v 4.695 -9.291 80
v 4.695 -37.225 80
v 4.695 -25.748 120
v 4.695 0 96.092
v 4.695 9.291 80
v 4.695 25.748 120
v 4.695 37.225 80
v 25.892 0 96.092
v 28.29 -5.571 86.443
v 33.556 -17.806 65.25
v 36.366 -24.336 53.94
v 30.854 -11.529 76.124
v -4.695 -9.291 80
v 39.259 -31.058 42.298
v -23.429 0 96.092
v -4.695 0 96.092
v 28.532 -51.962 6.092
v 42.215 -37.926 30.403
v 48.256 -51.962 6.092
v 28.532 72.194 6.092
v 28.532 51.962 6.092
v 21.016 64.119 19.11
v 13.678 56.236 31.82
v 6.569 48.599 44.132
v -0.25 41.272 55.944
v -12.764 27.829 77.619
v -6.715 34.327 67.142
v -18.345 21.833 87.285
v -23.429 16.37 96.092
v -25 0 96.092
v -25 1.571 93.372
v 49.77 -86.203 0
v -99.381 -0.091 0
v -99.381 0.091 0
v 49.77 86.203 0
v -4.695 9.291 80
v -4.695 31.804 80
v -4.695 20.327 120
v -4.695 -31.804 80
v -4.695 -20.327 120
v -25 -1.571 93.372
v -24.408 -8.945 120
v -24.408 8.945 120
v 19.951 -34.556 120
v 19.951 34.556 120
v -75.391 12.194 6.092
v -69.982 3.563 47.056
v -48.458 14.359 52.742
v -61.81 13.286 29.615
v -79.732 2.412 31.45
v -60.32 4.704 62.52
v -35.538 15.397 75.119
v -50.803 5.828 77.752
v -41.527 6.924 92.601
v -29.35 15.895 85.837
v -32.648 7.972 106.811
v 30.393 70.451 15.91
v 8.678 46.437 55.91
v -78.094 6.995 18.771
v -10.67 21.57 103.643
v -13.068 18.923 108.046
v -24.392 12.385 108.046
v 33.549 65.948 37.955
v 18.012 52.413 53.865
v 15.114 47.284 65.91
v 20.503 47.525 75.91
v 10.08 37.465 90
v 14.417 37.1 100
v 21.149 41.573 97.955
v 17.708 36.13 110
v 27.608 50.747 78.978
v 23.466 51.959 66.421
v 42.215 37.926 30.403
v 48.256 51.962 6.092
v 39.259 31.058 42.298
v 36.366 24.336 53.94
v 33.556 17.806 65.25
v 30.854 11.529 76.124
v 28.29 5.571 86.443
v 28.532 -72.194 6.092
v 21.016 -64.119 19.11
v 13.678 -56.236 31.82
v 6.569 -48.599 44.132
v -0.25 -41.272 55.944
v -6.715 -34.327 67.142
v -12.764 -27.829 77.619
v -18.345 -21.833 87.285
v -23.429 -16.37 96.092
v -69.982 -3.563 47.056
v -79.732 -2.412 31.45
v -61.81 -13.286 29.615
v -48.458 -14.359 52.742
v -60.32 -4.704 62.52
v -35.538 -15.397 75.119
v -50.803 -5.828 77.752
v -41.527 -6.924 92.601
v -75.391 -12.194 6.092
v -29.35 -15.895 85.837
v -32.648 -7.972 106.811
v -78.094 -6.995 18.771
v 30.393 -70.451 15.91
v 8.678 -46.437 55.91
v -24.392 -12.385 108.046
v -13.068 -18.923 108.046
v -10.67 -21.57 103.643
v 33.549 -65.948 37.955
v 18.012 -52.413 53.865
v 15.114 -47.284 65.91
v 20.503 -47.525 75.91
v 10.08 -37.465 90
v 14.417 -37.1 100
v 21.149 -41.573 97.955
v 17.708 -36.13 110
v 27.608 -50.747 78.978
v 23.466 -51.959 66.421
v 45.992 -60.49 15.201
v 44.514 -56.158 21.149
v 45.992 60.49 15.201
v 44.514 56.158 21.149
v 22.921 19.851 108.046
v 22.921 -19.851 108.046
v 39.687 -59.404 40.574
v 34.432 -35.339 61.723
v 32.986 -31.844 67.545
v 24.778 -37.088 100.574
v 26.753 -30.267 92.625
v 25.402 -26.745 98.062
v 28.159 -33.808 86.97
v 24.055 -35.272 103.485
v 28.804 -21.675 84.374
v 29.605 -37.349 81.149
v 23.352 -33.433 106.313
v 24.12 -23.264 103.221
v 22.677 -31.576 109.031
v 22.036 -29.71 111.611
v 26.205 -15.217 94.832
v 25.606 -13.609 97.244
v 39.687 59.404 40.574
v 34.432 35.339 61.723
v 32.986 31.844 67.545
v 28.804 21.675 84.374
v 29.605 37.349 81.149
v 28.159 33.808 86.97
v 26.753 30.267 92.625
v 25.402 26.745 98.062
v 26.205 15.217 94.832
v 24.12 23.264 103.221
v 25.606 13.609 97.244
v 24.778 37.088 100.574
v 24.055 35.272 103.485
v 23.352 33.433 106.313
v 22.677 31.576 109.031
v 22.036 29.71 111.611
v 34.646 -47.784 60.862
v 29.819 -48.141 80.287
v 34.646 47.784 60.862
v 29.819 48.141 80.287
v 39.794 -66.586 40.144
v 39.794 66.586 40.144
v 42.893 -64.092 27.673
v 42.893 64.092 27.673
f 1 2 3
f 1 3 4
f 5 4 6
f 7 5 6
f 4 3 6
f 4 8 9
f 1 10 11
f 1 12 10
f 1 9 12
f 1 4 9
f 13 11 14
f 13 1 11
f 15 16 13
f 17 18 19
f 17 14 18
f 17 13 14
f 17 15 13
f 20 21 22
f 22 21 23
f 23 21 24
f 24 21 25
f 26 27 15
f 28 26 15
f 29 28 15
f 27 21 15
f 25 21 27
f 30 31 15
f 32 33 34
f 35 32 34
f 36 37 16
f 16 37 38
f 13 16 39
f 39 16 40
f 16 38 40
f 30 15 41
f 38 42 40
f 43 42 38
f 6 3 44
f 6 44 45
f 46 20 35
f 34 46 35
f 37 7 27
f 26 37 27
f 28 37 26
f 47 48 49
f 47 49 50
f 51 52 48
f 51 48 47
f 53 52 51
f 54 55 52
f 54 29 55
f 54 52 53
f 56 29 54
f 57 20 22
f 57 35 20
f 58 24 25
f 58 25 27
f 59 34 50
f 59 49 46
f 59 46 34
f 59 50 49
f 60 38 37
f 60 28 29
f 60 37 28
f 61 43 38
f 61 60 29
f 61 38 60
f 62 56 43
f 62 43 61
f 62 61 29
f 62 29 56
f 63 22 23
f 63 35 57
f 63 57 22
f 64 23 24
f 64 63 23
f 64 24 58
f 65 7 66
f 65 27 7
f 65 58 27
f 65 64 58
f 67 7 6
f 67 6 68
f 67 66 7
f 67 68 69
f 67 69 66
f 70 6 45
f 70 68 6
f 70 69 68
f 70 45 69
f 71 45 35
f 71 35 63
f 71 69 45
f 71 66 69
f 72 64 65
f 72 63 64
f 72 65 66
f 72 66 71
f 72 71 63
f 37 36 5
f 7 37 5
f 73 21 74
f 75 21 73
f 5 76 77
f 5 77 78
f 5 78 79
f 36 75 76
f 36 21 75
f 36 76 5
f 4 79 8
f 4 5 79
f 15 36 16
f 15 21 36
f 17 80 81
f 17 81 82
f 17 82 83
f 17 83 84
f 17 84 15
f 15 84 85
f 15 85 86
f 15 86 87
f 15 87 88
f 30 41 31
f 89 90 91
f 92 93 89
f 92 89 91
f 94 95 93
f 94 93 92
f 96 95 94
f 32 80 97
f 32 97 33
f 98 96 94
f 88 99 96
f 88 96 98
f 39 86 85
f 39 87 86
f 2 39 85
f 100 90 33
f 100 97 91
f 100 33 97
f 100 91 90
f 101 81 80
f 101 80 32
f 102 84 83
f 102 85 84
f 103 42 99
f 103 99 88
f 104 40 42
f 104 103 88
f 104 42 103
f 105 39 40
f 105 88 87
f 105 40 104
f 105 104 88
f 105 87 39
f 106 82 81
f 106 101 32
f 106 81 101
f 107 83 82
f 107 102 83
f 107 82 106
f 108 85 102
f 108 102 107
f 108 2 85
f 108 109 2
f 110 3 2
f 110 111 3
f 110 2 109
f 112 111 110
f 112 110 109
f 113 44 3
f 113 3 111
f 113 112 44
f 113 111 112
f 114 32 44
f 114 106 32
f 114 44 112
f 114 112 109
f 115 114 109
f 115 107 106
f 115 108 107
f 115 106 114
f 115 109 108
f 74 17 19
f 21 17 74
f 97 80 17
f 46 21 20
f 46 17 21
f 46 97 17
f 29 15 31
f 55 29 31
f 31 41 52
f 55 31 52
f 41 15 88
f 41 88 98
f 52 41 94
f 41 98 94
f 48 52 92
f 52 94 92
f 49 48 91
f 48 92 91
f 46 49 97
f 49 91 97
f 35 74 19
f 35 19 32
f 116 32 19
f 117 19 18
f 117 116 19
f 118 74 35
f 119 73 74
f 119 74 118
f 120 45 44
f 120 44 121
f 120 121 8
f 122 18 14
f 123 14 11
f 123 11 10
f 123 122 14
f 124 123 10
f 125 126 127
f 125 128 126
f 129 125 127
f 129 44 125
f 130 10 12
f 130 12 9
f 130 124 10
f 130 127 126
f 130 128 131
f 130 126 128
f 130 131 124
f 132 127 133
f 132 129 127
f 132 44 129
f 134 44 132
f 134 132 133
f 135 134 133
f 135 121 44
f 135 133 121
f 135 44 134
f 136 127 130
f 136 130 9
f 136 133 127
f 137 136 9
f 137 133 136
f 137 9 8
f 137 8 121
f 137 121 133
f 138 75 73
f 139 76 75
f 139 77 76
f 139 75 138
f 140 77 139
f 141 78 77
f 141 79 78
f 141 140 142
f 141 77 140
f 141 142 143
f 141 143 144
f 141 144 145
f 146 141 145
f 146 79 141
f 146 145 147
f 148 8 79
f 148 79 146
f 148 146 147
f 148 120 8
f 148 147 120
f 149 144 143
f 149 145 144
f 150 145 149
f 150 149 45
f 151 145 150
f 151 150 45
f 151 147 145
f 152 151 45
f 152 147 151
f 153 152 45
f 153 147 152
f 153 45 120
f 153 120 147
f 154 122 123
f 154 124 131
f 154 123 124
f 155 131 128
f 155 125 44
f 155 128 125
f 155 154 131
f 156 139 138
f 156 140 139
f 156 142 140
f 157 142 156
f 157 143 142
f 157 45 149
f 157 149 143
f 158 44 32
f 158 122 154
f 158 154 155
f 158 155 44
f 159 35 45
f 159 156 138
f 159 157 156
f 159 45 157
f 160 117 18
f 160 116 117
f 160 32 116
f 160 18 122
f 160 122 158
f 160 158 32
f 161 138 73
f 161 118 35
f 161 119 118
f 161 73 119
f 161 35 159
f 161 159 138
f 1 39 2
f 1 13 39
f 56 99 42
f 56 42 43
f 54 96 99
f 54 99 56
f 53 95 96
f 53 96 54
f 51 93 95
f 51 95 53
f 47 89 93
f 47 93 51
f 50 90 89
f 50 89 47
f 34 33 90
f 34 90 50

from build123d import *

# Parameters (mm, degrees)
F5_DEPTH       = 40
F10_DEPTH      = 100
F10_DEPTH_BACK = 100
F12_DEPTH      = 100
F12_DEPTH_BACK = 25


with BuildPart() as f3:
    # F0 (on Top) → F3 section 0
    with BuildSketch(Plane.XY):
        Polygon((49.7695431113, -86.2033773383), (49.7695431113, 86.2033773383), (-99.5390862226, 0), align=None)
    # F2 (on offset) → F3 section 1
    with BuildSketch(Plane.XY.offset(120)):
        Polygon((19.951004535, -34.5561535166), (19.951004535, 34.5561535166), (-39.9020090699, 0), align=None)
    loft()

    # F4 (on face) → F5 (cut)
    with BuildSketch(Plane.XY.offset(120)):
        Polygon((4.6946327202, -25.7478831425), (4.6946327202, 25.7478831425), (-4.6946327202, 20.326988213), (-4.6946327202, -20.326988213), align=None)
        Polygon((4.6946327202, 25.7478831425), (4.6946327202, 48.1600351632), (-4.6946327202, 48.1600351632), (-4.6946327202, 20.326988213), align=None)
        Polygon((4.6946327202, -48.1600351632), (4.6946327202, -25.7478831425), (-4.6946327202, -20.326988213), (-4.6946327202, -48.1600351632), align=None)
    extrude(amount=-F5_DEPTH, mode=Mode.SUBTRACT)

    # F8: sweep along a path in F7
    with BuildLine(Plane.XZ) as f8_path:
        Line((-31.9719016552, 120.4966977239), (-107.2546765208, 0))
    # F6 (on face) → F8 (sweep, cut)
    with BuildSketch(Plane.XY.offset(120)):
        Polygon((-40.3947457671, 19.6701809764), (-40.3947457671, -19.6701809764), (-24.4082733989, -19.6701809764), (-24.4082733989, -8.9453124604), (-24.4082733989, 19.6701809764), align=None)
    sweep(path=f8_path.line, mode=Mode.SUBTRACT)

    # F9 (on Front) → F10 (cut, two sides)
    with BuildSketch(Plane.XZ) as f10_sk:
        Polygon((-75.3909720121, 6.0918268561), (28.532076442, 6.0918268561), (-23.429447785, 96.0918268561), align=None)
    extrude(amount=-F10_DEPTH, mode=Mode.SUBTRACT)
    extrude(f10_sk.sketch, amount=F10_DEPTH_BACK, mode=Mode.SUBTRACT)

    # F11 (on Right) → F12 (cut, two sides)
    with BuildSketch(Plane.YZ) as f12_sk:
        Polygon((-51.9615242271, 6.0918268561), (51.9615242271, 6.0918268561), (0, 96.0918268561), align=None)
    extrude(amount=F12_DEPTH, mode=Mode.SUBTRACT)
    extrude(f12_sk.sketch, amount=-F12_DEPTH_BACK, mode=Mode.SUBTRACT)


solid = f3.part
